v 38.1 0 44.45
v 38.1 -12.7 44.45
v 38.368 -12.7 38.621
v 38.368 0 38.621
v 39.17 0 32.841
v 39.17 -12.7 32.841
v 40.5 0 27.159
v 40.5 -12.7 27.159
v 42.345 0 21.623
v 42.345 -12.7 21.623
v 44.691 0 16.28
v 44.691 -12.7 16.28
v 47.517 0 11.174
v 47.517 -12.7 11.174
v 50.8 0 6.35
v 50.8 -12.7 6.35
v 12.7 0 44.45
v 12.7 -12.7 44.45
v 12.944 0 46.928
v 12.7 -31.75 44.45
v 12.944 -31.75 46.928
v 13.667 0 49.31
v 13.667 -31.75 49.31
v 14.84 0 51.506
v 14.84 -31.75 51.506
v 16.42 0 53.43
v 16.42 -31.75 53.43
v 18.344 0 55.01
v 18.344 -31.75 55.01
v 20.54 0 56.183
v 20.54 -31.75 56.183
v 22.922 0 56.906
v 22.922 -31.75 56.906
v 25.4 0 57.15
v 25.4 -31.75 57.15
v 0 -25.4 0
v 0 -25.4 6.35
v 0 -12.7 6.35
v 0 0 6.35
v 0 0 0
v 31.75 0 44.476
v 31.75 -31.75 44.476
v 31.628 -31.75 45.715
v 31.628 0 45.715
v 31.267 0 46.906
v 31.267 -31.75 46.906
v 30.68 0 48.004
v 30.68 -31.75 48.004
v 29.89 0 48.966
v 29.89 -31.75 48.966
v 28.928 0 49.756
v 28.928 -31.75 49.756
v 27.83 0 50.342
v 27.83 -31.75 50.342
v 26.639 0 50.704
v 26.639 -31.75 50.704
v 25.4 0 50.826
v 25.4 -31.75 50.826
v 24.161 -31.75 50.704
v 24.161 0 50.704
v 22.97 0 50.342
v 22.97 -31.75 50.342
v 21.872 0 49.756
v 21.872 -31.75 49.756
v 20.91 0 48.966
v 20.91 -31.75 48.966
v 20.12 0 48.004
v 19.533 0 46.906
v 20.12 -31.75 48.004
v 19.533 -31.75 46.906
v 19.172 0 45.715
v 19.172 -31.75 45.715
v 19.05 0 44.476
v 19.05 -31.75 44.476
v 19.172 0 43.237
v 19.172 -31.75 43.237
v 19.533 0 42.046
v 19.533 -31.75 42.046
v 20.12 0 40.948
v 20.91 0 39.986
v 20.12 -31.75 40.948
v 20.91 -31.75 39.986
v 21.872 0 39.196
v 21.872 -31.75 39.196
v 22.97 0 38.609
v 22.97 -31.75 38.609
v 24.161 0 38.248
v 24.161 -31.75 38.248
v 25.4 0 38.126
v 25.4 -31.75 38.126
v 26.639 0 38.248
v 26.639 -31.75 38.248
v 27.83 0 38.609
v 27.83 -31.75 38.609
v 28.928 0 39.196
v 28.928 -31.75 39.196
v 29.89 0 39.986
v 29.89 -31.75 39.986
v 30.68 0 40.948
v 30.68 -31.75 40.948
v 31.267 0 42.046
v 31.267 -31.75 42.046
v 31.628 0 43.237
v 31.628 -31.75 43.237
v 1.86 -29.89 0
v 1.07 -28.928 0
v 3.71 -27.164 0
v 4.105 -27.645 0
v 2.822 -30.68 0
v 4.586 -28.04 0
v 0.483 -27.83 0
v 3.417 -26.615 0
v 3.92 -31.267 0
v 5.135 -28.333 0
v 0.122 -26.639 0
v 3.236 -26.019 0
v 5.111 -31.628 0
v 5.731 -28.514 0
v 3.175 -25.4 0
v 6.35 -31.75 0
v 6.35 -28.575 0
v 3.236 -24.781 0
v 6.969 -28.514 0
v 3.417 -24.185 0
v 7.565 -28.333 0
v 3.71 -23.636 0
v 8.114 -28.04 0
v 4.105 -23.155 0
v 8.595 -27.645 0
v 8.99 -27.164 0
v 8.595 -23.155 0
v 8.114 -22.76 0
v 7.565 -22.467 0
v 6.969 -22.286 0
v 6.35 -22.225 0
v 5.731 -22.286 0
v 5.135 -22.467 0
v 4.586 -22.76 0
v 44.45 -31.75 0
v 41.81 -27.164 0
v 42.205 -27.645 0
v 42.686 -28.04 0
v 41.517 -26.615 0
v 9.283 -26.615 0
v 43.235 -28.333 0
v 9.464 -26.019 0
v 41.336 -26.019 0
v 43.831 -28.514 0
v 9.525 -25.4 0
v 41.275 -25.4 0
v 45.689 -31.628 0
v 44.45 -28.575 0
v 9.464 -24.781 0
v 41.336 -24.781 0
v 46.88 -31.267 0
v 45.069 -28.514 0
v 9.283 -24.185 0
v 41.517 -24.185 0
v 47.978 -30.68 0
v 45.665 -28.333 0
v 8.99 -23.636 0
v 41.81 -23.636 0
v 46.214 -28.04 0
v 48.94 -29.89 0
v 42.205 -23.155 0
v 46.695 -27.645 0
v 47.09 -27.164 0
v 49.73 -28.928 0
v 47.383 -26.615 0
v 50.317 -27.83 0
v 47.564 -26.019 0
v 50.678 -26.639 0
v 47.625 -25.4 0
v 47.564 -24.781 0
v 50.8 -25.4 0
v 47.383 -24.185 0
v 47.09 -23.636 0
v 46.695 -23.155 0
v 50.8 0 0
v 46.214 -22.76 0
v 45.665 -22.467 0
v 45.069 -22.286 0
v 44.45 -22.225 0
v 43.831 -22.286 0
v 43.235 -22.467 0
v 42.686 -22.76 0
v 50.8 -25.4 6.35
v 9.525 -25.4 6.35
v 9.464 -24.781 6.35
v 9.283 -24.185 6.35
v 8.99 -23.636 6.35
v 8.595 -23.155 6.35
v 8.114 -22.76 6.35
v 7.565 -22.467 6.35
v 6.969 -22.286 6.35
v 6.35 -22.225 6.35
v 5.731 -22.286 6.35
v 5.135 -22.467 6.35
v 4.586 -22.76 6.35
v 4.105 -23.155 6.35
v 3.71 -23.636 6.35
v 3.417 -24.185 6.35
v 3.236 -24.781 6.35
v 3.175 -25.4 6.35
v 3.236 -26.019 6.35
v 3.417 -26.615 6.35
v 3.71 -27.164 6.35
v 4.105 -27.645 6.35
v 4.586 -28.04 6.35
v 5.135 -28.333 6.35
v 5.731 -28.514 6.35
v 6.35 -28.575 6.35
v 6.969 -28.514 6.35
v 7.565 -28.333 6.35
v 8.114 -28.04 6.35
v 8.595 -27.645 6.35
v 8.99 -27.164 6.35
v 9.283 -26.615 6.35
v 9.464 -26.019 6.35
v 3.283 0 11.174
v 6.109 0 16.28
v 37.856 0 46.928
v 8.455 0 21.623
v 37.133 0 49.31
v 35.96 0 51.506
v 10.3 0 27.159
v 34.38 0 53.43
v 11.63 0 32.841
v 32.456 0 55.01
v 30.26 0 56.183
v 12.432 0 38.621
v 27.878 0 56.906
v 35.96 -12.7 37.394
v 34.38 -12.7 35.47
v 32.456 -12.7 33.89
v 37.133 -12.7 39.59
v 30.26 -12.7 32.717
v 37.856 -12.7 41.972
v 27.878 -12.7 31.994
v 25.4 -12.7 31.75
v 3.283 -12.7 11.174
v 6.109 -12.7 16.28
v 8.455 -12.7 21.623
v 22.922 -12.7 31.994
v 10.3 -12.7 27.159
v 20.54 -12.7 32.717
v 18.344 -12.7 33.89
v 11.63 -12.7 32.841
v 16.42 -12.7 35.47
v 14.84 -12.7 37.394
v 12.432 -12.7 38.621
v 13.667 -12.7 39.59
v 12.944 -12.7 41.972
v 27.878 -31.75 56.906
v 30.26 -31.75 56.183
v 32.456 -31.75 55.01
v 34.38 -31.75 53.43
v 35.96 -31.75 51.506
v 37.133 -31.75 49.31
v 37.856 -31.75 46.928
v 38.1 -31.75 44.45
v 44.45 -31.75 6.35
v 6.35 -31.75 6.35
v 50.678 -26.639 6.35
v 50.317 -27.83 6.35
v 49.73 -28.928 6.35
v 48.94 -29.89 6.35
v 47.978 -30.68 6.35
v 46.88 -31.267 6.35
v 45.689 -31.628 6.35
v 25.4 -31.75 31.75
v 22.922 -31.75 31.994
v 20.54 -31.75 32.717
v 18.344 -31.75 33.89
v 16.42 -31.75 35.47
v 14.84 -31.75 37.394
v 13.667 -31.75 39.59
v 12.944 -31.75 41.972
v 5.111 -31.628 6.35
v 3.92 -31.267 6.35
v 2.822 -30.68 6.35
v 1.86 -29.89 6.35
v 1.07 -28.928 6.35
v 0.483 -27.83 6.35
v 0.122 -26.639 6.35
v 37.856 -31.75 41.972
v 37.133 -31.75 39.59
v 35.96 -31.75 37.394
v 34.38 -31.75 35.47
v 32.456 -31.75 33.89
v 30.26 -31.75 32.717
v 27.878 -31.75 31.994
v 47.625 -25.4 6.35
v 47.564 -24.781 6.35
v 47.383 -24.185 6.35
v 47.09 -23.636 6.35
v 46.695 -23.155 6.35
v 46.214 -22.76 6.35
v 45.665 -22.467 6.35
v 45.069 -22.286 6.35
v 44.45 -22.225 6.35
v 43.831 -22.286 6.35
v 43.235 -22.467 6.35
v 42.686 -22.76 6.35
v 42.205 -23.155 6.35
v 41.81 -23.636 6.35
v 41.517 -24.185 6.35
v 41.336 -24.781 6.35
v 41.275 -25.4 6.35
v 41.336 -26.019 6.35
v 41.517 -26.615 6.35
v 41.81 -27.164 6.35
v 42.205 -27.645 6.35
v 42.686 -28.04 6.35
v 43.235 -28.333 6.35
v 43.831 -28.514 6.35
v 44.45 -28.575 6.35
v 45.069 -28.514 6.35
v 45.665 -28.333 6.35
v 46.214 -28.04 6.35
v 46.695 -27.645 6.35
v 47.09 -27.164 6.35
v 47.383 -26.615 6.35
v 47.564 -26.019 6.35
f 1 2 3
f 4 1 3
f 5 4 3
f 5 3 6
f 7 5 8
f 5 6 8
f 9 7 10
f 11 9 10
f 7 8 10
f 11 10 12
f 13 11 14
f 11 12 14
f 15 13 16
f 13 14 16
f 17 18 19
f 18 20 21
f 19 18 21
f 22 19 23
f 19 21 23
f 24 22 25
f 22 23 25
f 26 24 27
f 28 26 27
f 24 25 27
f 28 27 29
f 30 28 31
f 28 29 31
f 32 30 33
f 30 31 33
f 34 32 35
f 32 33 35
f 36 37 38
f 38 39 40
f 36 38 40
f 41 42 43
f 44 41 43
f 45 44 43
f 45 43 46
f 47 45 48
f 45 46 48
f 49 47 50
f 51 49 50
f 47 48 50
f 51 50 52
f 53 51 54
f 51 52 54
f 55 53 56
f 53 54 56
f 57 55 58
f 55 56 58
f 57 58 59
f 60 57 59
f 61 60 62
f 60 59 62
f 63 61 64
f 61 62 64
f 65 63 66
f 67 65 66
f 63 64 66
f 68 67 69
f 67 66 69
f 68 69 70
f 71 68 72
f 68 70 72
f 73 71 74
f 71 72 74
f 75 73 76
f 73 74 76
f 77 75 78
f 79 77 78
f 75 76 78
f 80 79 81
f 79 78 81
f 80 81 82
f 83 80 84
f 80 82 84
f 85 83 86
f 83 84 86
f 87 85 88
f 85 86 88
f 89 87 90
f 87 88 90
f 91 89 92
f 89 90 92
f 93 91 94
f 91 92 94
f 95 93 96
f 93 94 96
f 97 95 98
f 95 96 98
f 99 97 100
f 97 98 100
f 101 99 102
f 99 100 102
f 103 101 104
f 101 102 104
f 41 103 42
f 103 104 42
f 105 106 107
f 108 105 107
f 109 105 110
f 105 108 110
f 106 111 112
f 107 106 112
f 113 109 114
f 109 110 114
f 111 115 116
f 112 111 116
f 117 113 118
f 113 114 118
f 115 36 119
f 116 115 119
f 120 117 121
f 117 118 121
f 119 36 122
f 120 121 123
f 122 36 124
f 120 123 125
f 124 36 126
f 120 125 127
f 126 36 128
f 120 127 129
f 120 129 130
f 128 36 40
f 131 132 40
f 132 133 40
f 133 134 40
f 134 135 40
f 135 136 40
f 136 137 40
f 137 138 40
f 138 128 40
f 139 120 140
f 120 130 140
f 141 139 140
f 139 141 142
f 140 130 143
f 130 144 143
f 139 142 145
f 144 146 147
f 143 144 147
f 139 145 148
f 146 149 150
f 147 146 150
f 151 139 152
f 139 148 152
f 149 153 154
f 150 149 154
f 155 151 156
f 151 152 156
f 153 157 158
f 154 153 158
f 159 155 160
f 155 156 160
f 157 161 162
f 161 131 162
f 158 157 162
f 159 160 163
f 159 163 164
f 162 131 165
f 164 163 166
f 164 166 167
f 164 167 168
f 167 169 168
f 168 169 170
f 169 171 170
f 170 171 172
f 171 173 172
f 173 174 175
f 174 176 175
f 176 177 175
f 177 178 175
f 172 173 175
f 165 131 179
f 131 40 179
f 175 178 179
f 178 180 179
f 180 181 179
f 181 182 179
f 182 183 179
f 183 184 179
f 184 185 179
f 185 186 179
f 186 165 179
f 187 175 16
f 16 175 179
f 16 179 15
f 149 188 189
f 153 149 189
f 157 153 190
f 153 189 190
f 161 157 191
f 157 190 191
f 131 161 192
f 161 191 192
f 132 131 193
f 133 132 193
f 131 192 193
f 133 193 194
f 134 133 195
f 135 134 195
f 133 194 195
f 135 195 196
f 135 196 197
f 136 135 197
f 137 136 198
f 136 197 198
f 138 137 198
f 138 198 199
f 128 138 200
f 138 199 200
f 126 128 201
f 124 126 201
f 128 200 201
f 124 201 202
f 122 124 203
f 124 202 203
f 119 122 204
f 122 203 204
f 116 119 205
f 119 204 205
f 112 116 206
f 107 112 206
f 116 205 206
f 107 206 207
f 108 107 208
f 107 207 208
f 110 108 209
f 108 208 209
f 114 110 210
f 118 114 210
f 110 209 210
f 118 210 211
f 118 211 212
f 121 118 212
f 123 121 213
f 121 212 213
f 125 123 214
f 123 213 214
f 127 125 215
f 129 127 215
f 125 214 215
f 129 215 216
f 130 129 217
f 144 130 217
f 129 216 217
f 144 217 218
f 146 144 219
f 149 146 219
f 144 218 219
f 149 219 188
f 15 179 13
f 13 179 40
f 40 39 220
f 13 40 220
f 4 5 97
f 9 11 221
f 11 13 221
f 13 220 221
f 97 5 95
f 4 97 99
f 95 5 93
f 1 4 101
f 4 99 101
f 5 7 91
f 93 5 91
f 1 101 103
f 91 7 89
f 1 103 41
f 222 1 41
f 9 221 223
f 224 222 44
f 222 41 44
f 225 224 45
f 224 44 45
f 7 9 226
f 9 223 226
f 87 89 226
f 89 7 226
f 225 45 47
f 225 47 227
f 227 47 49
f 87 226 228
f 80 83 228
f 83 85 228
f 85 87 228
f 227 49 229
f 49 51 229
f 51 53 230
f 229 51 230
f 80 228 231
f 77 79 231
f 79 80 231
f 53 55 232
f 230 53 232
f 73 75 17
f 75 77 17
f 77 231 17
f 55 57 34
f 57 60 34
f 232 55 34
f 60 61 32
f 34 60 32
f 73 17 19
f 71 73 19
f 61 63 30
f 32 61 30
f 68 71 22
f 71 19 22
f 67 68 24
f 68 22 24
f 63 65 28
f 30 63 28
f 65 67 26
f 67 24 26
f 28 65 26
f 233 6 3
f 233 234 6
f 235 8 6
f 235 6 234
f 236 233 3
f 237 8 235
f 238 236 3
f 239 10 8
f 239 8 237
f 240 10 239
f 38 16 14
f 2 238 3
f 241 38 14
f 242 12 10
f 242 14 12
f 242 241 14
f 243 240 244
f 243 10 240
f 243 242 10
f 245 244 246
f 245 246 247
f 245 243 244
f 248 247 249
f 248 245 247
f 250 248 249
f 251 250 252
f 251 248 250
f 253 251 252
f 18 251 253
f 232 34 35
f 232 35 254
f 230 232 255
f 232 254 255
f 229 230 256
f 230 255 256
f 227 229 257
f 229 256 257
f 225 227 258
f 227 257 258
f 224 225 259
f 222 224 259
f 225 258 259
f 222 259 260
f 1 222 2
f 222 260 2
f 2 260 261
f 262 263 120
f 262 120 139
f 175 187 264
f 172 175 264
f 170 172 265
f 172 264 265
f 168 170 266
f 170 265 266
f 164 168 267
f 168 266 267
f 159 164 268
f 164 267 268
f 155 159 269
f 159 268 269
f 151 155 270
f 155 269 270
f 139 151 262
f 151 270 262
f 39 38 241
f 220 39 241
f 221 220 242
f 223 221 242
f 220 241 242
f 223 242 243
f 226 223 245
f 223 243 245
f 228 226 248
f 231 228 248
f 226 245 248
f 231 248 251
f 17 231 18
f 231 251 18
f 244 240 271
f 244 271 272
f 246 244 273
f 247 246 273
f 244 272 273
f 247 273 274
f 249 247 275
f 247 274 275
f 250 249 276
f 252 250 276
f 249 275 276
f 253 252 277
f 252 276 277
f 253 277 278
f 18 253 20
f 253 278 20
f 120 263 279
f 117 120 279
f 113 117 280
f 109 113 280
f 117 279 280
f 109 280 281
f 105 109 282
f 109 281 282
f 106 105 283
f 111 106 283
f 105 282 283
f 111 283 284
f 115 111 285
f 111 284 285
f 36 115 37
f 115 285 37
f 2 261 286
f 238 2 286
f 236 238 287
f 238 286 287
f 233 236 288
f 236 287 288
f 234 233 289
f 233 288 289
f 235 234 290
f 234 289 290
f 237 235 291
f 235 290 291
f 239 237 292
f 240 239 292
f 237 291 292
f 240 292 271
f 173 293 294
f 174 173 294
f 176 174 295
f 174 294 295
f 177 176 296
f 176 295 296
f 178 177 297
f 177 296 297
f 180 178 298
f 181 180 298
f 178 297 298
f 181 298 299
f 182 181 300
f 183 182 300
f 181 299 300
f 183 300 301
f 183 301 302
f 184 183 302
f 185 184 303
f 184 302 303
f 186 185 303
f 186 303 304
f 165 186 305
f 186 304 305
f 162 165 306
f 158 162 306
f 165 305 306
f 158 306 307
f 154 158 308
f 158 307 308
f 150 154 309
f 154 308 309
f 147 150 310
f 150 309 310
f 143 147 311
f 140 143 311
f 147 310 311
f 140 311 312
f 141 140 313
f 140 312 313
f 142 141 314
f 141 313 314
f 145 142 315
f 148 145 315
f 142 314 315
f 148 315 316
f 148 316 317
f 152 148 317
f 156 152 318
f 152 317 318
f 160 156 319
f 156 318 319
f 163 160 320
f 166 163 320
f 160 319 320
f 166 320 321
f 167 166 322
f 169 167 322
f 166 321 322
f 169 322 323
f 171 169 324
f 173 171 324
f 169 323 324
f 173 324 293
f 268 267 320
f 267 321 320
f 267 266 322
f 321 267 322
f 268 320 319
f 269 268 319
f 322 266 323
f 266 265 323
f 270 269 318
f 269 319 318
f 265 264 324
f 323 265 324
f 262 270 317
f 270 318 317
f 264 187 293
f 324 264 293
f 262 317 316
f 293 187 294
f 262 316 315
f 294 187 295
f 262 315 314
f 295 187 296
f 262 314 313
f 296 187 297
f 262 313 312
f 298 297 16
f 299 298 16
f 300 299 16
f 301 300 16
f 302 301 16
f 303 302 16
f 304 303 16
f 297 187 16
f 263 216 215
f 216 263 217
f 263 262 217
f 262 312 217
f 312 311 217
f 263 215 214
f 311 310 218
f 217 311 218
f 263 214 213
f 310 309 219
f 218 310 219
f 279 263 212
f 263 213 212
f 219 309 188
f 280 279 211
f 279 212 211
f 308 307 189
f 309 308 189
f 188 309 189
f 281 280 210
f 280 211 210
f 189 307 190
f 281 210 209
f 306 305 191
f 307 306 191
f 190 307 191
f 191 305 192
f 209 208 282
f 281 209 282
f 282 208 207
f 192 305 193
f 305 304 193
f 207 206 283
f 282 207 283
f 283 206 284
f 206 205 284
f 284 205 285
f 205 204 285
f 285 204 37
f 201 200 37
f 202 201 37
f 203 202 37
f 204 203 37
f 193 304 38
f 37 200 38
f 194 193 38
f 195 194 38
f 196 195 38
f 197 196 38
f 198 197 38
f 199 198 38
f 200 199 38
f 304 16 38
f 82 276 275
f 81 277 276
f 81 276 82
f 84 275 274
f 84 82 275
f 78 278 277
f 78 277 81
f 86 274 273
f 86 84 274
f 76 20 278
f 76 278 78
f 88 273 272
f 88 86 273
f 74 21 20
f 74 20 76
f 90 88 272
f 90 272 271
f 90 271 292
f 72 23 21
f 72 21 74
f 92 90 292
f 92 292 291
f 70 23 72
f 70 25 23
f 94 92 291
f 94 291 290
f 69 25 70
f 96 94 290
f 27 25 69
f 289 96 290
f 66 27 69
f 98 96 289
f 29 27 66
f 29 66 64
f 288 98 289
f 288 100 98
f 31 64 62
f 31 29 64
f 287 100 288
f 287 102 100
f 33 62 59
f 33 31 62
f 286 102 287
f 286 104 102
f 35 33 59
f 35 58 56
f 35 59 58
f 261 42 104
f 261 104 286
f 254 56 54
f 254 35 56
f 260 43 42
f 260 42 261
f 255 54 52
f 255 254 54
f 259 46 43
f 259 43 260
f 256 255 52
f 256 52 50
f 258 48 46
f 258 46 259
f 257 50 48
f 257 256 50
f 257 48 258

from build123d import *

# Parameters (mm, degrees)
F1_DEPTH  = 31.75
F3_DEPTH  = 31.75
F7_DEPTH  = 19.05
F9_W      = 50.8
F9_H      = 19.05
F10_DEPTH = 31.75
F11_DEPTH = 19.05
F13_DEPTH = 19.05
F14_DEPTH = 12.7
F15_DEPTH = 12.7
F17_DEPTH = 12.7
F18_R     = 6.35
F19_DEPTH = 31.75
F20_R     = 3.175
F21_DEPTH = 6.35
F23_DEPTH = 6.35
F25_DEPTH = 6.35


with BuildPart() as f1:
    # F0 (on Front) → F1 (new body)
    with BuildSketch(Plane.XZ):
        Polygon((0, 6.35), (0, 0), (50.8, 0), (50.8, 6.35), (38.1, 6.35), (38.1, 57.15), (12.7, 57.15), (12.7, 6.35), align=None)
    extrude(amount=F1_DEPTH)

    # F2 (on face) → F3 (cut)
    with BuildSketch(Plane.XZ.offset(31.75)):
        with BuildLine():
            ThreePointArc((12.7, 44.45), (16.4197438789, 53.4302561211), (25.4, 57.15))
            Line((25.4, 57.15), (12.7, 57.15))
            Line((12.7, 57.15), (12.7, 44.45))
        make_face()
        with BuildLine():
            ThreePointArc((25.4, 57.15), (34.3802561211, 53.4302561211), (38.1, 44.45))
            Line((38.1, 44.45), (38.1, 57.15))
            Line((38.1, 57.15), (25.4, 57.15))
        make_face()
    extrude(amount=-F3_DEPTH, mode=Mode.SUBTRACT)

    # F5 (on face) → F7 (cut)
    with BuildSketch(Plane.XZ.offset(31.75)):
        with BuildLine():
            ThreePointArc((38.1, 44.45), (34.3802561211, 35.4697438789), (25.4, 31.75))
            Line((25.4, 31.75), (38.1, 31.75))
            Line((38.1, 31.75), (38.1, 44.45))
        make_face()
    extrude(amount=-F7_DEPTH, mode=Mode.SUBTRACT)

    # F9 (on face) → F10 (cut)
    with BuildSketch(Plane(origin=(0, 0, 0), x_dir=(1, 0, 0), z_dir=(0, 0, -1))):
        with Locations((25.4, 22.225)):
            Rectangle(F9_W, F9_H)
    extrude(amount=-F10_DEPTH, mode=Mode.SUBTRACT)

    # F8 (on face) → F11 (cut)
    with BuildSketch(Plane.XZ.offset(31.75)):
        with BuildLine():
            Line((12.7, 31.75), (25.4, 31.75))
            ThreePointArc((25.4, 31.75), (16.4197438789, 35.4697438789), (12.7, 44.45))
            Line((12.7, 44.45), (12.7, 31.75))
        make_face()
    extrude(amount=-F11_DEPTH, mode=Mode.SUBTRACT)

    # F12 (on face) → F13 (join)
    with BuildSketch(Plane.XZ.offset(12.7)):
        Polygon((38.1, 6.35), (12.7, 6.35), (0, 6.35), (0, 0), (50.8, 0), (50.8, 6.35), align=None)
    extrude(amount=F13_DEPTH)

    # F14 (add): a face of the model
    f14_faces = [f1.faces().sort_by_distance(p)[0] for p in [
        (12.7, -6.35, 25.4),
    ]]
    extrude(f14_faces, amount=F14_DEPTH)

    # F15 (add): a face of the model
    f15_faces = [f1.faces().sort_by_distance(p)[0] for p in [
        (38.1, -6.35, 25.4),
    ]]
    extrude(f15_faces, amount=F15_DEPTH)

    # F16 (on face) → F17 (cut)
    with BuildSketch(Plane.XZ.offset(12.7)):
        with BuildLine():
            Line((0, 44.45), (0, 6.35))
            ThreePointArc((0, 6.35), (9.4413894262, 24.3695368579), (12.7, 44.45))
            Line((12.7, 44.45), (0, 44.45))
        make_face()
        with BuildLine():
            ThreePointArc((38.1, 44.45), (41.3586105738, 24.3695368579), (50.8, 6.35))
            Line((50.8, 6.35), (50.8, 44.45))
            Line((50.8, 44.45), (38.1, 44.45))
        make_face()
    extrude(amount=-F17_DEPTH, mode=Mode.SUBTRACT)

    # F18 (on face) → F19 (cut)
    with BuildSketch(Plane.XZ.offset(31.75)):
        with Locations((25.4, 44.4756895304)):
            Circle(F18_R)
    extrude(amount=-F19_DEPTH, mode=Mode.SUBTRACT)

    # F20 (on face) → F21 (cut)
    with BuildSketch(Plane.XY.offset(6.35)):
        with Locations((44.45, -25.4)):
            Circle(F20_R)
        with Locations((6.35, -25.4)):
            Circle(F20_R)
    extrude(amount=-F21_DEPTH, mode=Mode.SUBTRACT)

    # F22 (on face) → F23 (cut)
    with BuildSketch(Plane.XY.offset(6.35)):
        with BuildLine():
            ThreePointArc((6.35, -31.75), (1.8598719395, -29.8901280605), (0, -25.4))
            Line((0, -25.4), (0, -31.75))
            Line((0, -31.75), (6.35, -31.75))
        make_face()
    extrude(amount=-F23_DEPTH, mode=Mode.SUBTRACT)

    # F24 (on face) → F25 (cut)
    with BuildSketch(Plane.XY.offset(6.35)):
        with BuildLine():
            ThreePointArc((50.8, -25.4), (48.9401280605, -29.8901280605), (44.45, -31.75))
            Line((44.45, -31.75), (50.8, -31.75))
            Line((50.8, -31.75), (50.8, -25.4))
        make_face()
    extrude(amount=-F25_DEPTH, mode=Mode.SUBTRACT)


solid = f1.part
